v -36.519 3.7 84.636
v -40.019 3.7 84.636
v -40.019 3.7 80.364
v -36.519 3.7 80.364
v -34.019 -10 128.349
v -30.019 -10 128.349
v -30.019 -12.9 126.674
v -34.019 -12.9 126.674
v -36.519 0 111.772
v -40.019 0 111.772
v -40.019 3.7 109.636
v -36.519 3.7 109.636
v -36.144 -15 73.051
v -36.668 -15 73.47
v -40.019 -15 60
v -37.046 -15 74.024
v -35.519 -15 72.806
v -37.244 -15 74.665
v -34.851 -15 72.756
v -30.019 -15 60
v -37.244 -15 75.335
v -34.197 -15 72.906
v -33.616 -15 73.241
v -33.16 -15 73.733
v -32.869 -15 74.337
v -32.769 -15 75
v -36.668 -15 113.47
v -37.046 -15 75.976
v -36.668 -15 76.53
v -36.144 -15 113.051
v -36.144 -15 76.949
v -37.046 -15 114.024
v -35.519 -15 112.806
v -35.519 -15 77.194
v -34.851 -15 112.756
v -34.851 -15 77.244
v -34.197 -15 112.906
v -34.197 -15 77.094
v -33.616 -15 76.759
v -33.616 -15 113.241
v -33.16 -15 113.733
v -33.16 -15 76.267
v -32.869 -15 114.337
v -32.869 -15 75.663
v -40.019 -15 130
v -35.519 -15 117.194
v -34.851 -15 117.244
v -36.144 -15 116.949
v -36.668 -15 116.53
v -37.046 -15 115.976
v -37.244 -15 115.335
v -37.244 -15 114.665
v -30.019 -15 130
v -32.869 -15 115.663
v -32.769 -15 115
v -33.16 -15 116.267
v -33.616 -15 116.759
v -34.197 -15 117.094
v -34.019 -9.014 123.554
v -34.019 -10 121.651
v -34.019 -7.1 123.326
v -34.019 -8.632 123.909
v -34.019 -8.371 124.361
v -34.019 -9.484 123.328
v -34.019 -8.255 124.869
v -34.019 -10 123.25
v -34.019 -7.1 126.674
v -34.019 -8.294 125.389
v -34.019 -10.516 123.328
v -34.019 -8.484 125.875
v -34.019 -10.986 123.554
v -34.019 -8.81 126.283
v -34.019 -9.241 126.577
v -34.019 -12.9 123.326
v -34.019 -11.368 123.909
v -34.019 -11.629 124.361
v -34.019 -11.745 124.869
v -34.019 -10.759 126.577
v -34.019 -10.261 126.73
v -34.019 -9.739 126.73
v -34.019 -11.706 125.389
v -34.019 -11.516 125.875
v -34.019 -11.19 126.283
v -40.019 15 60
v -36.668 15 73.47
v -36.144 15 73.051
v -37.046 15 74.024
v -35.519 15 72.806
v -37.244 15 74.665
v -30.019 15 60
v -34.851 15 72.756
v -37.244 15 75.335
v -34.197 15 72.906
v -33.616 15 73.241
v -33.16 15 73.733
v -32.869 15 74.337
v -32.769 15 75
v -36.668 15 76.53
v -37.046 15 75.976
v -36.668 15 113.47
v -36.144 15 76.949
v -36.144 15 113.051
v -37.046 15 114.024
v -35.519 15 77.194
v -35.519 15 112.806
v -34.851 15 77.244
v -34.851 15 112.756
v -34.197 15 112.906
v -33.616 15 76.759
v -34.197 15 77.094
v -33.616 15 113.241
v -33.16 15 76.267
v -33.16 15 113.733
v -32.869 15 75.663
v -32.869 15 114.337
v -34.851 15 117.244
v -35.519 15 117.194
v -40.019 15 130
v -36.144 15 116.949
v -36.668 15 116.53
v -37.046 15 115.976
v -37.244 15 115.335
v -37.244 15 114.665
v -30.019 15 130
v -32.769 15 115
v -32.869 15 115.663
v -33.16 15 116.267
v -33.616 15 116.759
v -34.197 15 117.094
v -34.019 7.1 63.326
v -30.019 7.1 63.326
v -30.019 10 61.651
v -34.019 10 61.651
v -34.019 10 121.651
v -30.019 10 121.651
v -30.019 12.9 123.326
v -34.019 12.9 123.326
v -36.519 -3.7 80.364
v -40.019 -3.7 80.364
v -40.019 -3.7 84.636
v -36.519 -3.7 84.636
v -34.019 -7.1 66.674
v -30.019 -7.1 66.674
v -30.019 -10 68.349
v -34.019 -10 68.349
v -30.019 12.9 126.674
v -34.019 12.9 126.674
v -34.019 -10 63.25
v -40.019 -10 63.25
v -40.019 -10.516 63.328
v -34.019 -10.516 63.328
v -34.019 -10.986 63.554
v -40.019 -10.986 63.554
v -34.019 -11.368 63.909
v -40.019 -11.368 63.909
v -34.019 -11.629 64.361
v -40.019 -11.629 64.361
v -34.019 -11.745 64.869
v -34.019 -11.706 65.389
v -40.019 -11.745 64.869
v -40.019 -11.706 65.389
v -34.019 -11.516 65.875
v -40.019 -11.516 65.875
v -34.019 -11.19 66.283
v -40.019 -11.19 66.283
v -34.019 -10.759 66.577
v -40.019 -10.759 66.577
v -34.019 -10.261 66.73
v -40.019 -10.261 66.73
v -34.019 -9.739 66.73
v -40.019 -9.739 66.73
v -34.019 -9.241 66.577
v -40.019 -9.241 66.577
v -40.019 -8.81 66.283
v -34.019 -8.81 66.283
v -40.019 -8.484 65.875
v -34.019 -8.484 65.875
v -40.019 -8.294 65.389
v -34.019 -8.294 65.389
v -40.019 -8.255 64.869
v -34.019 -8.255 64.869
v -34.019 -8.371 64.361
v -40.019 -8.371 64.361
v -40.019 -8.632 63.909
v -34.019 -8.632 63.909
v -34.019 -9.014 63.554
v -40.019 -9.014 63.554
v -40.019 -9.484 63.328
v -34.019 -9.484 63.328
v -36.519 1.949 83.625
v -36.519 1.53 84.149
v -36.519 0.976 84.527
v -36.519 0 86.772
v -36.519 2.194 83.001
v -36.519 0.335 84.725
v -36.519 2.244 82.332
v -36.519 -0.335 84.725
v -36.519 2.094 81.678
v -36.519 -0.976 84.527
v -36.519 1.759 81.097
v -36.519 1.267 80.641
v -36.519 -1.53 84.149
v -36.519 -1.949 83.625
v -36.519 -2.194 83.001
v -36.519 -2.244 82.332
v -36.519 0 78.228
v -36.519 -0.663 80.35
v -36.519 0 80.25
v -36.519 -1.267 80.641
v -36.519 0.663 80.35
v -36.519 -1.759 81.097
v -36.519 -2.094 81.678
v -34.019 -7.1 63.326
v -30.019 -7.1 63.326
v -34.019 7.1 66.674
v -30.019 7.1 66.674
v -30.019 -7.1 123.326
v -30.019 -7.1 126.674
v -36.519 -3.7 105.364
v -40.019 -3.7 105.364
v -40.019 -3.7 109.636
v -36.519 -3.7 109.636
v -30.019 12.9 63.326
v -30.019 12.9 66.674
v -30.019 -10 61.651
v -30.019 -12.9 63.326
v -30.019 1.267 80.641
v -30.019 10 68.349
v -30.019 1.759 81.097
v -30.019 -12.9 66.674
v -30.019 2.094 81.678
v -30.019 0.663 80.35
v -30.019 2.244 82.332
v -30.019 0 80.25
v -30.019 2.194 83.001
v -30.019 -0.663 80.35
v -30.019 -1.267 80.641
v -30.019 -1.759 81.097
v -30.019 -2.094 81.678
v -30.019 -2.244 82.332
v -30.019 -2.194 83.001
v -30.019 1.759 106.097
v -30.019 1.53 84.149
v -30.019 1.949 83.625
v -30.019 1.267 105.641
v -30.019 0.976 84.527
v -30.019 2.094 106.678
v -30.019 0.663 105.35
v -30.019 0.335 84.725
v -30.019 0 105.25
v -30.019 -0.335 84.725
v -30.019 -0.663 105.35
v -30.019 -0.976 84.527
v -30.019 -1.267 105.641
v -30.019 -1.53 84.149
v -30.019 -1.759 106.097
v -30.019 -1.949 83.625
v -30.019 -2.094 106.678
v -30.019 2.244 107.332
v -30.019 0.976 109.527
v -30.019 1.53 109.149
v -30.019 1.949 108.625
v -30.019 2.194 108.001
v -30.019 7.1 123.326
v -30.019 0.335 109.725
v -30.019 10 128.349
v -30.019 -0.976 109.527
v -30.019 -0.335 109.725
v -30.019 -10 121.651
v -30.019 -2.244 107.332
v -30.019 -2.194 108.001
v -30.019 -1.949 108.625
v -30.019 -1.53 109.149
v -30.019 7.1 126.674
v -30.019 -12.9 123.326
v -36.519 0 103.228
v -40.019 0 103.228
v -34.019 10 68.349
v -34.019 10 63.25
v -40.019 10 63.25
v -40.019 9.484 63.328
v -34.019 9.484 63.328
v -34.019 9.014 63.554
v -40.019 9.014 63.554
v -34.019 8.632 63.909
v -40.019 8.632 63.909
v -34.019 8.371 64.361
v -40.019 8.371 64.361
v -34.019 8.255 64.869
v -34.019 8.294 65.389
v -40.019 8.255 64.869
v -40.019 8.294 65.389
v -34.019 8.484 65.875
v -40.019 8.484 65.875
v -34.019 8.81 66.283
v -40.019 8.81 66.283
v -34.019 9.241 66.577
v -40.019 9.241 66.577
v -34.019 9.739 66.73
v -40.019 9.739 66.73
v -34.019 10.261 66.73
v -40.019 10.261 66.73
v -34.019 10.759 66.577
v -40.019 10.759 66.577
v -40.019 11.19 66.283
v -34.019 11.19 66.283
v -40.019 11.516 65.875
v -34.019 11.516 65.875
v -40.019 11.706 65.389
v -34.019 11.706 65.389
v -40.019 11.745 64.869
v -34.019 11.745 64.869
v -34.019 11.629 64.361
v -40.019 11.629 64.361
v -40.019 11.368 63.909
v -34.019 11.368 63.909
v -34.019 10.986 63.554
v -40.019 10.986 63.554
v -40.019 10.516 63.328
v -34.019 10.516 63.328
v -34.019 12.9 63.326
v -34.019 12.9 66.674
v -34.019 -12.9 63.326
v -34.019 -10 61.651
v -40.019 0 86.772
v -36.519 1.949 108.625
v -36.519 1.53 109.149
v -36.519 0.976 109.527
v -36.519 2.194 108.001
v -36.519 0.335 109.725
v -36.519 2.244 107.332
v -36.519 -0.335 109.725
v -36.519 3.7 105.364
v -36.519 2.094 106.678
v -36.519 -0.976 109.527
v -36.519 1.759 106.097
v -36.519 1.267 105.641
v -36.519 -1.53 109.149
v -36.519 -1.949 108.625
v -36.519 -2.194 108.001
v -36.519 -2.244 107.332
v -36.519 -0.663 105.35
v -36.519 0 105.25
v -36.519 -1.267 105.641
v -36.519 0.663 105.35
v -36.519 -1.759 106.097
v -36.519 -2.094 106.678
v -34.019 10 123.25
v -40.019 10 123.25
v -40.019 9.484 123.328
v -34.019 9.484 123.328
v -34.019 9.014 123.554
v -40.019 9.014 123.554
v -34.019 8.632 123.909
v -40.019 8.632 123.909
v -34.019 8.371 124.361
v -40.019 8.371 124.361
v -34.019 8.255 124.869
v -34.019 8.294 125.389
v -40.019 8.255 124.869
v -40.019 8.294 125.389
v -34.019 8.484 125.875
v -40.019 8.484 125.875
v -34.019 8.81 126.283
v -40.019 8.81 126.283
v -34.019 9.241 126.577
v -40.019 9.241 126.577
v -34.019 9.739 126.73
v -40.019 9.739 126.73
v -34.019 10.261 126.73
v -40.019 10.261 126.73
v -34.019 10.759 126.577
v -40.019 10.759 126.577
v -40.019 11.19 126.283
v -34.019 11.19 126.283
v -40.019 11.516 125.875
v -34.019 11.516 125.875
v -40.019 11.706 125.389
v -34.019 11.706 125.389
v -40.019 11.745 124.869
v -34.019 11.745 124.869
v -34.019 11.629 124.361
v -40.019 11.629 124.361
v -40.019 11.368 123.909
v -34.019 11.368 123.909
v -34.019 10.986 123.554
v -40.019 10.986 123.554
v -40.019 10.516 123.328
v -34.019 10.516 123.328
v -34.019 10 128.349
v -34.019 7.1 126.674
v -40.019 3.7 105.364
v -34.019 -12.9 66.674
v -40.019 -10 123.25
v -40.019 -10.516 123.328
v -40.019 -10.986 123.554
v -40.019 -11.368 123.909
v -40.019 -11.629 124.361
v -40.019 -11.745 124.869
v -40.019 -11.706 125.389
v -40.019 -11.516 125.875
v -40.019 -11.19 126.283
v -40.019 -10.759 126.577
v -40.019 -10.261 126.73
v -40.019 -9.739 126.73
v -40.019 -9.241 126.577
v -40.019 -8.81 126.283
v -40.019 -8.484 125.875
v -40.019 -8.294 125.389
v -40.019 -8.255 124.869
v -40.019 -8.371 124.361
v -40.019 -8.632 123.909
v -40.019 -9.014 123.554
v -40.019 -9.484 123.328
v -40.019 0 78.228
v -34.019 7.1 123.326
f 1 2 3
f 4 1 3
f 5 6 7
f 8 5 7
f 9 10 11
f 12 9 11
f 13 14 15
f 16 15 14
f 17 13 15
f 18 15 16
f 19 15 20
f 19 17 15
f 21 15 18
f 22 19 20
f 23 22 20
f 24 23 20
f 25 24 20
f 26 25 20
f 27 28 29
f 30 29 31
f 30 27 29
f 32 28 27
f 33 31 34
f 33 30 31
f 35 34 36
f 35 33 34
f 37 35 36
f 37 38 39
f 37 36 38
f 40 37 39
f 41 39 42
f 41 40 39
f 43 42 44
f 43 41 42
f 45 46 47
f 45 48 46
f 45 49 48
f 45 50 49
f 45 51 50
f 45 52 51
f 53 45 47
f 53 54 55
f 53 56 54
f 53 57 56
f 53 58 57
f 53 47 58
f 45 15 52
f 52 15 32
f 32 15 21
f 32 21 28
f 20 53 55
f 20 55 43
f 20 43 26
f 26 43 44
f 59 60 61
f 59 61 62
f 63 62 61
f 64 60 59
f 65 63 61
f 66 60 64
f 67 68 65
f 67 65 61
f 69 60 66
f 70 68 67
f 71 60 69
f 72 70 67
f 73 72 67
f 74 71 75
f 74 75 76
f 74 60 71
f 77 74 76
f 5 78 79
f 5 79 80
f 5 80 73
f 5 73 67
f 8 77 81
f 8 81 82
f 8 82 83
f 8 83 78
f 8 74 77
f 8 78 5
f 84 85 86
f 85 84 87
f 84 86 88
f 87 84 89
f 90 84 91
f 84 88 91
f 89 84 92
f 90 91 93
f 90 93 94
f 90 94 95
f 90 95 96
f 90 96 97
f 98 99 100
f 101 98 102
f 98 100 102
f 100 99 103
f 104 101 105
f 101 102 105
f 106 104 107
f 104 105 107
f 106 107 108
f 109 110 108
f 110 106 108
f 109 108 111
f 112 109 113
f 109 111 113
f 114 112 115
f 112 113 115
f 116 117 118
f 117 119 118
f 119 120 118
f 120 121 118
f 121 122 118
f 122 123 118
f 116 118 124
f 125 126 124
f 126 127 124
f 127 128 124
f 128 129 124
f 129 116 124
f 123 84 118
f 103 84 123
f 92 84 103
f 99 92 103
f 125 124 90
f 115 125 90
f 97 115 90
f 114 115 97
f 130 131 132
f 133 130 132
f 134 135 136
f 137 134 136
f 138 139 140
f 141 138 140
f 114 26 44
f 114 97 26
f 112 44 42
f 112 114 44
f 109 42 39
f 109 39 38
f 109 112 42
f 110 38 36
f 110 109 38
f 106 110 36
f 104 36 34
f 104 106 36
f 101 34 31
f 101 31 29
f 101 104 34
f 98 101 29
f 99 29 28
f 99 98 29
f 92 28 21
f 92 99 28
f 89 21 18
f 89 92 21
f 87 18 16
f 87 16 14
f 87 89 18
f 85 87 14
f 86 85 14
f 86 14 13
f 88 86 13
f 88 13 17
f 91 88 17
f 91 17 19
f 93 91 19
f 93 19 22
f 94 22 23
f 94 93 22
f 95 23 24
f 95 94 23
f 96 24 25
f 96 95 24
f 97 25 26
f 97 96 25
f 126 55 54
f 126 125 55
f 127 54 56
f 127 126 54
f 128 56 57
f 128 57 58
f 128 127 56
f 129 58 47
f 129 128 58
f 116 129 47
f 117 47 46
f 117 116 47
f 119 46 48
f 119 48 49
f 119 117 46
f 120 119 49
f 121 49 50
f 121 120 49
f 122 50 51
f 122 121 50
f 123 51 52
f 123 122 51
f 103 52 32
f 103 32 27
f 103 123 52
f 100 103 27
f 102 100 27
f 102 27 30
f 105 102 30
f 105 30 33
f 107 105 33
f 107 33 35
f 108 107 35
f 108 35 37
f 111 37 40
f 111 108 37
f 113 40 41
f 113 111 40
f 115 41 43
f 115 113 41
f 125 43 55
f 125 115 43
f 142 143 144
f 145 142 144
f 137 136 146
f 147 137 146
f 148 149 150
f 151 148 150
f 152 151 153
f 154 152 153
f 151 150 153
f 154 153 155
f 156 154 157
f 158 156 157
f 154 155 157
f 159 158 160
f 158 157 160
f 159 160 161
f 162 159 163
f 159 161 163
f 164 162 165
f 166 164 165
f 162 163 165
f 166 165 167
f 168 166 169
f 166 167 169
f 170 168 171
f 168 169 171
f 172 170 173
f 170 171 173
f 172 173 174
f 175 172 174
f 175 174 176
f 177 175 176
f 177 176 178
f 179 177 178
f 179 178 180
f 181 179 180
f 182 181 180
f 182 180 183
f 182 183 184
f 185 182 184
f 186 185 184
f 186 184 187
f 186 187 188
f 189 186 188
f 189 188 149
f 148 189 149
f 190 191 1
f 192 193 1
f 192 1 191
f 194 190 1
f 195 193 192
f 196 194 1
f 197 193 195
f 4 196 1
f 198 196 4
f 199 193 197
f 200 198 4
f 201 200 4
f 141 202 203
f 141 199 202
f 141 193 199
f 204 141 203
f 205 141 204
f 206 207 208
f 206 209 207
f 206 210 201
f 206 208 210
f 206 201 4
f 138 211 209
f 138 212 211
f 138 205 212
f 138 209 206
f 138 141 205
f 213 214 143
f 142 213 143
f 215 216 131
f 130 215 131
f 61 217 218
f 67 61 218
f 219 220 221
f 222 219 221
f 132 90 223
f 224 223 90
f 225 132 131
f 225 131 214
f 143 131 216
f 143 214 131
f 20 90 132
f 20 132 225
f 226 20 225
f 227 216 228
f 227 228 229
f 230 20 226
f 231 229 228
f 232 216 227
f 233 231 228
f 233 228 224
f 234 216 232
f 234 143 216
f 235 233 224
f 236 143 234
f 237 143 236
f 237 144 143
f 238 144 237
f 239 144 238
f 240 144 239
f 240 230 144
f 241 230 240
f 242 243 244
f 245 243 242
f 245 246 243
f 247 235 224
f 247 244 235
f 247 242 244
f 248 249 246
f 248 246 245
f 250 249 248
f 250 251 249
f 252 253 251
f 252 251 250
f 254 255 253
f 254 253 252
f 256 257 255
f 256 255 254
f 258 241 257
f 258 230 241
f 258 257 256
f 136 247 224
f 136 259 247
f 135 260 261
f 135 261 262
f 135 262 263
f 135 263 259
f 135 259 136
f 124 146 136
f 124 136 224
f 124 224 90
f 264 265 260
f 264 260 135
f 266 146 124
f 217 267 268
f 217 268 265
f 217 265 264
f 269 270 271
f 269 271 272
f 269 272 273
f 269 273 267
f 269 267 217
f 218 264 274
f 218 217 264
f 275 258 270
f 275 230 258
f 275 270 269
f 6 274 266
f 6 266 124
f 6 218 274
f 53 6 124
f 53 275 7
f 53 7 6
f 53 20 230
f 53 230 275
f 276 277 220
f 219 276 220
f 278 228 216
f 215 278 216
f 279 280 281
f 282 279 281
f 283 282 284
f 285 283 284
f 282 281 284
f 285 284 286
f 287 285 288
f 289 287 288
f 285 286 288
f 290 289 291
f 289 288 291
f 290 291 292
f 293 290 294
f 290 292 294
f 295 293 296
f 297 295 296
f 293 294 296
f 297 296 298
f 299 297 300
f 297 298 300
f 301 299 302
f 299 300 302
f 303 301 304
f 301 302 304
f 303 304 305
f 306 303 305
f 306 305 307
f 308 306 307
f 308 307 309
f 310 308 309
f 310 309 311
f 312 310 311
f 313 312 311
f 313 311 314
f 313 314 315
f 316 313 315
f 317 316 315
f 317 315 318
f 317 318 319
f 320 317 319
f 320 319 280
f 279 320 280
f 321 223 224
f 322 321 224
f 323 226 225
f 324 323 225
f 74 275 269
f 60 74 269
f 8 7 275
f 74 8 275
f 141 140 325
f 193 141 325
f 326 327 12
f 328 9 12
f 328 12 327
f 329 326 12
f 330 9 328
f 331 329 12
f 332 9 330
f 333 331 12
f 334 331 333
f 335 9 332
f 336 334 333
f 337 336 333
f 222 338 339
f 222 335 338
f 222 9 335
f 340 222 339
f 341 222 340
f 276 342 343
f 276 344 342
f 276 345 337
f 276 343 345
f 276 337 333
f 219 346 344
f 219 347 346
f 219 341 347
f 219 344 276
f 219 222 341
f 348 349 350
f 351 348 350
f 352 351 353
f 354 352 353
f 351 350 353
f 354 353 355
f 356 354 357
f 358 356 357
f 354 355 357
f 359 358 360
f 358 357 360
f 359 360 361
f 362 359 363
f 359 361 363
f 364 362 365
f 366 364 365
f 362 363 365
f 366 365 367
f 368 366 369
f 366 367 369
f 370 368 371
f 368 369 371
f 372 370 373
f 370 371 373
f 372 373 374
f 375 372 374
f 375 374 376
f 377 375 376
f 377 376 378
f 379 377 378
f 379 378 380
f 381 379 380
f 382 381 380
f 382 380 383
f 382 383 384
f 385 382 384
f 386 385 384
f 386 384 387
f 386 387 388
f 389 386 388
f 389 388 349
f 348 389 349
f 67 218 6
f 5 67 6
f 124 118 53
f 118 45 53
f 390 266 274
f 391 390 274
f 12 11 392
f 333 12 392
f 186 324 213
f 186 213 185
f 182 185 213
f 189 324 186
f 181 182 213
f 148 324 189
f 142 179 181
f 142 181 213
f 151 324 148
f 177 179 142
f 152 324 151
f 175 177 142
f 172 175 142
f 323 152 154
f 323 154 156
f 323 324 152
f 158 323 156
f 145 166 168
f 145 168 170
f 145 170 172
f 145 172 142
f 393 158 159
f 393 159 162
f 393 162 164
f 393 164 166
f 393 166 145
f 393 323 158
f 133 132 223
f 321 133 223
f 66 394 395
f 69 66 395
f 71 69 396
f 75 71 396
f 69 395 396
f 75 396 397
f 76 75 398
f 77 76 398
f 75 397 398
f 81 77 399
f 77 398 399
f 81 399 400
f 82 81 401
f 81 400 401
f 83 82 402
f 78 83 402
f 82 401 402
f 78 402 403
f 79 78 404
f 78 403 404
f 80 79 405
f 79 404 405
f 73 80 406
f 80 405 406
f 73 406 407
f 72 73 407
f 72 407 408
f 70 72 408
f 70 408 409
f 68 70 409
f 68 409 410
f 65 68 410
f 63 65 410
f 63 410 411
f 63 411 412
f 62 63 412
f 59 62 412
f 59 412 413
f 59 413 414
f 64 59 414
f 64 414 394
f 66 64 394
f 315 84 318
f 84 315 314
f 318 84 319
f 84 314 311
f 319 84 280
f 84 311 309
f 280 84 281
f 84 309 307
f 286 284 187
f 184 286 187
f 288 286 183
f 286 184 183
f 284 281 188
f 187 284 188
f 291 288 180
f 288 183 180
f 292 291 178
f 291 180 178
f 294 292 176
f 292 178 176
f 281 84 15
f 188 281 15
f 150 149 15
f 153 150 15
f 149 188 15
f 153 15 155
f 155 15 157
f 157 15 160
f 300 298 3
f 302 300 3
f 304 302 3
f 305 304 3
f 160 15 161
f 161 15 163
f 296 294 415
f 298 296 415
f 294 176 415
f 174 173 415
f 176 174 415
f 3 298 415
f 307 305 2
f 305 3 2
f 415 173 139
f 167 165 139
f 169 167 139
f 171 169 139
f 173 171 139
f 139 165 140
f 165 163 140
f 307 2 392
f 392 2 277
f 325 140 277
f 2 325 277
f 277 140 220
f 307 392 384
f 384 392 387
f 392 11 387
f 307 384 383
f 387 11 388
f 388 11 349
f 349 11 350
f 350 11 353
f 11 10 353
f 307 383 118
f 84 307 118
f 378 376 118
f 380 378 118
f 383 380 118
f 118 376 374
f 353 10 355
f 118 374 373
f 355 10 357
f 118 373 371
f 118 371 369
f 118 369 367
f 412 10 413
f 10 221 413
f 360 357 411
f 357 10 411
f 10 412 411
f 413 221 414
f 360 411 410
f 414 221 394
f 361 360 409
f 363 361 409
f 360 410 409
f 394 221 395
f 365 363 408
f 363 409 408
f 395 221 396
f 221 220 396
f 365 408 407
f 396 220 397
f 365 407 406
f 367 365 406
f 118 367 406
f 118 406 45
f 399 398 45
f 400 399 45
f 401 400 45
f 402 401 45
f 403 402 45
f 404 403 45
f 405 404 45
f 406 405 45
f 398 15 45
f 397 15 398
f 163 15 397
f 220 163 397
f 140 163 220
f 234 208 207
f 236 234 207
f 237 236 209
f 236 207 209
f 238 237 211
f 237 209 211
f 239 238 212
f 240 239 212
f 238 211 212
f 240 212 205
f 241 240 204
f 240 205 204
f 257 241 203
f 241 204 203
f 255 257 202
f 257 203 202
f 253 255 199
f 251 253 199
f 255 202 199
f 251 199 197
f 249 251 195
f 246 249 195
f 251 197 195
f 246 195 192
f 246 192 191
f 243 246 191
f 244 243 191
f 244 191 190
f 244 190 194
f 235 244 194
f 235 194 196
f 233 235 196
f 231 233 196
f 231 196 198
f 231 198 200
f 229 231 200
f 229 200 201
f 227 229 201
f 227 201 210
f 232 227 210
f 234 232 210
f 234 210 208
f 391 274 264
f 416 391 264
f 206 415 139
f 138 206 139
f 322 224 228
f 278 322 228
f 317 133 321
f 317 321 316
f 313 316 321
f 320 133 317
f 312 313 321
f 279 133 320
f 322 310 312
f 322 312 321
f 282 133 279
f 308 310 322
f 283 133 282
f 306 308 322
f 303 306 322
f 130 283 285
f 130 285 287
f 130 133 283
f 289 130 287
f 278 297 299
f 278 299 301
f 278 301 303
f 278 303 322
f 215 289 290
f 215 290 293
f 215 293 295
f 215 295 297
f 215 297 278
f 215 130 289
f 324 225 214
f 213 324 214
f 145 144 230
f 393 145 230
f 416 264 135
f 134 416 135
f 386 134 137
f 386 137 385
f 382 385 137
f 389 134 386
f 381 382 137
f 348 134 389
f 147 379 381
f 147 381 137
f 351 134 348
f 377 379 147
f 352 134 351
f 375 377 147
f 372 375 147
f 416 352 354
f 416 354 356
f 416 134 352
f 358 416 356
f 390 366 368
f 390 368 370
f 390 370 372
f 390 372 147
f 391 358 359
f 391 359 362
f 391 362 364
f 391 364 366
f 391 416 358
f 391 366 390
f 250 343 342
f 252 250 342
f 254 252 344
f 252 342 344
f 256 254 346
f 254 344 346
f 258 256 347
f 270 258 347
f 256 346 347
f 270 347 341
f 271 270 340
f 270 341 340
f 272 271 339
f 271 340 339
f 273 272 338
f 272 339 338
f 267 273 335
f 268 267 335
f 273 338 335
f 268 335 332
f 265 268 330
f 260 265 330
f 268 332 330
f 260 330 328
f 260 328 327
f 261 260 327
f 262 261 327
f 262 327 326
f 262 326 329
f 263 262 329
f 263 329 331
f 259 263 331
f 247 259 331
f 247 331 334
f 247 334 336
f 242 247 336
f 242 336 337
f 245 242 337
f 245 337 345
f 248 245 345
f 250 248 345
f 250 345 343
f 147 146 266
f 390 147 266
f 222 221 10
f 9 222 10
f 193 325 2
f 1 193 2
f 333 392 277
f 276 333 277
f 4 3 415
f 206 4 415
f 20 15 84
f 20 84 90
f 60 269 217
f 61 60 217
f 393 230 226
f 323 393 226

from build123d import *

# Parameters (mm, degrees)
SKETCH086_W     = 10
SKETCH086_H     = 70
SKETCH086_R     = 2.25
PAD058_DEPTH    = 15
SKETCH087_R     = 2.25
SKETCH087_R_2   = 1.75
POCKET021_DEPTH = 25
POCKET065_DEPTH = 3.5
POCKET066_DEPTH = 4


with BuildPart() as part:
    # Sketch086 → Pad058 (new body, symmetric)
    with BuildSketch(Plane.XZ):
        with Locations((-0.018685, 5)):
            Rectangle(SKETCH086_W, SKETCH086_H)
        with Locations((-0.018685, 25)):
            Circle(SKETCH086_R, mode=Mode.SUBTRACT)
        with Locations((-0.018685, -15)):
            Circle(SKETCH086_R, mode=Mode.SUBTRACT)
    extrude(amount=PAD058_DEPTH, both=True)

    # Sketch087 (on Face4 of Pad058) → Pocket021 (cut)
    with BuildSketch(Plane(origin=(-5.018685, 0, 0), x_dir=(0, 0, -1), z_dir=(-1, 0, 0))):
        with Locations((-17.5, 0)):
            Circle(SKETCH087_R)
        with Locations((7.5, 0)):
            Circle(SKETCH087_R)
        with Locations((-35, 10)):
            Circle(SKETCH087_R_2)
        with Locations((-35, -10)):
            Circle(SKETCH087_R_2)
        with Locations((25, 10)):
            Circle(SKETCH087_R_2)
        with Locations((25, -10)):
            Circle(SKETCH087_R_2)
    extrude(amount=-POCKET021_DEPTH, mode=Mode.SUBTRACT)

    # Sketch261 (on Face2 of Pocket021) → Pocket065 (cut)
    with BuildSketch(Plane(origin=(-5.018685, 0, 0), x_dir=(0, 0, -1), z_dir=(-1, 0, 0))):
        Polygon((-15.363804, 3.7), (-19.636196, 3.7), (-21.772392, 0), (-19.636196, -3.7), (-15.363804, -3.7), (-13.227608, 0), align=None)
        Polygon((9.636196, 3.7), (5.363804, 3.7), (3.227608, 0), (5.363804, -3.7), (9.636196, -3.7), (11.772392, 0), align=None)
    extrude(amount=-POCKET065_DEPTH, mode=Mode.SUBTRACT)

    # Sketch262 (on Face3 of Pocket065) → Pocket066 (cut)
    with BuildSketch(Plane(origin=(4.981315, 0, 0), x_dir=(0, 0, 1), z_dir=(1, 0, 0))):
        Polygon((36.674316, 12.9), (33.325684, 12.9), (31.651368, 10), (33.325684, 7.1), (36.674316, 7.1), (38.348632, 10), align=None)
        Polygon((36.674316, -7.1), (33.325684, -7.1), (31.651368, -10), (33.325684, -12.9), (36.674316, -12.9), (38.348632, -10), align=None)
        Polygon((-23.325684, -7.1), (-26.674316, -7.1), (-28.348632, -10), (-26.674316, -12.9), (-23.325684, -12.9), (-21.651368, -10), align=None)
        Polygon((-21.651368, 10), (-23.325684, 12.9), (-26.674316, 12.9), (-28.348632, 10), (-26.674316, 7.1), (-23.325684, 7.1), align=None)
    extrude(amount=-POCKET066_DEPTH, mode=Mode.SUBTRACT)


with BuildPart() as part_1:
    # Body043 placement: moved
    add(part.part.moved(Location((-35, 0, 90))))


solid = part_1.part
